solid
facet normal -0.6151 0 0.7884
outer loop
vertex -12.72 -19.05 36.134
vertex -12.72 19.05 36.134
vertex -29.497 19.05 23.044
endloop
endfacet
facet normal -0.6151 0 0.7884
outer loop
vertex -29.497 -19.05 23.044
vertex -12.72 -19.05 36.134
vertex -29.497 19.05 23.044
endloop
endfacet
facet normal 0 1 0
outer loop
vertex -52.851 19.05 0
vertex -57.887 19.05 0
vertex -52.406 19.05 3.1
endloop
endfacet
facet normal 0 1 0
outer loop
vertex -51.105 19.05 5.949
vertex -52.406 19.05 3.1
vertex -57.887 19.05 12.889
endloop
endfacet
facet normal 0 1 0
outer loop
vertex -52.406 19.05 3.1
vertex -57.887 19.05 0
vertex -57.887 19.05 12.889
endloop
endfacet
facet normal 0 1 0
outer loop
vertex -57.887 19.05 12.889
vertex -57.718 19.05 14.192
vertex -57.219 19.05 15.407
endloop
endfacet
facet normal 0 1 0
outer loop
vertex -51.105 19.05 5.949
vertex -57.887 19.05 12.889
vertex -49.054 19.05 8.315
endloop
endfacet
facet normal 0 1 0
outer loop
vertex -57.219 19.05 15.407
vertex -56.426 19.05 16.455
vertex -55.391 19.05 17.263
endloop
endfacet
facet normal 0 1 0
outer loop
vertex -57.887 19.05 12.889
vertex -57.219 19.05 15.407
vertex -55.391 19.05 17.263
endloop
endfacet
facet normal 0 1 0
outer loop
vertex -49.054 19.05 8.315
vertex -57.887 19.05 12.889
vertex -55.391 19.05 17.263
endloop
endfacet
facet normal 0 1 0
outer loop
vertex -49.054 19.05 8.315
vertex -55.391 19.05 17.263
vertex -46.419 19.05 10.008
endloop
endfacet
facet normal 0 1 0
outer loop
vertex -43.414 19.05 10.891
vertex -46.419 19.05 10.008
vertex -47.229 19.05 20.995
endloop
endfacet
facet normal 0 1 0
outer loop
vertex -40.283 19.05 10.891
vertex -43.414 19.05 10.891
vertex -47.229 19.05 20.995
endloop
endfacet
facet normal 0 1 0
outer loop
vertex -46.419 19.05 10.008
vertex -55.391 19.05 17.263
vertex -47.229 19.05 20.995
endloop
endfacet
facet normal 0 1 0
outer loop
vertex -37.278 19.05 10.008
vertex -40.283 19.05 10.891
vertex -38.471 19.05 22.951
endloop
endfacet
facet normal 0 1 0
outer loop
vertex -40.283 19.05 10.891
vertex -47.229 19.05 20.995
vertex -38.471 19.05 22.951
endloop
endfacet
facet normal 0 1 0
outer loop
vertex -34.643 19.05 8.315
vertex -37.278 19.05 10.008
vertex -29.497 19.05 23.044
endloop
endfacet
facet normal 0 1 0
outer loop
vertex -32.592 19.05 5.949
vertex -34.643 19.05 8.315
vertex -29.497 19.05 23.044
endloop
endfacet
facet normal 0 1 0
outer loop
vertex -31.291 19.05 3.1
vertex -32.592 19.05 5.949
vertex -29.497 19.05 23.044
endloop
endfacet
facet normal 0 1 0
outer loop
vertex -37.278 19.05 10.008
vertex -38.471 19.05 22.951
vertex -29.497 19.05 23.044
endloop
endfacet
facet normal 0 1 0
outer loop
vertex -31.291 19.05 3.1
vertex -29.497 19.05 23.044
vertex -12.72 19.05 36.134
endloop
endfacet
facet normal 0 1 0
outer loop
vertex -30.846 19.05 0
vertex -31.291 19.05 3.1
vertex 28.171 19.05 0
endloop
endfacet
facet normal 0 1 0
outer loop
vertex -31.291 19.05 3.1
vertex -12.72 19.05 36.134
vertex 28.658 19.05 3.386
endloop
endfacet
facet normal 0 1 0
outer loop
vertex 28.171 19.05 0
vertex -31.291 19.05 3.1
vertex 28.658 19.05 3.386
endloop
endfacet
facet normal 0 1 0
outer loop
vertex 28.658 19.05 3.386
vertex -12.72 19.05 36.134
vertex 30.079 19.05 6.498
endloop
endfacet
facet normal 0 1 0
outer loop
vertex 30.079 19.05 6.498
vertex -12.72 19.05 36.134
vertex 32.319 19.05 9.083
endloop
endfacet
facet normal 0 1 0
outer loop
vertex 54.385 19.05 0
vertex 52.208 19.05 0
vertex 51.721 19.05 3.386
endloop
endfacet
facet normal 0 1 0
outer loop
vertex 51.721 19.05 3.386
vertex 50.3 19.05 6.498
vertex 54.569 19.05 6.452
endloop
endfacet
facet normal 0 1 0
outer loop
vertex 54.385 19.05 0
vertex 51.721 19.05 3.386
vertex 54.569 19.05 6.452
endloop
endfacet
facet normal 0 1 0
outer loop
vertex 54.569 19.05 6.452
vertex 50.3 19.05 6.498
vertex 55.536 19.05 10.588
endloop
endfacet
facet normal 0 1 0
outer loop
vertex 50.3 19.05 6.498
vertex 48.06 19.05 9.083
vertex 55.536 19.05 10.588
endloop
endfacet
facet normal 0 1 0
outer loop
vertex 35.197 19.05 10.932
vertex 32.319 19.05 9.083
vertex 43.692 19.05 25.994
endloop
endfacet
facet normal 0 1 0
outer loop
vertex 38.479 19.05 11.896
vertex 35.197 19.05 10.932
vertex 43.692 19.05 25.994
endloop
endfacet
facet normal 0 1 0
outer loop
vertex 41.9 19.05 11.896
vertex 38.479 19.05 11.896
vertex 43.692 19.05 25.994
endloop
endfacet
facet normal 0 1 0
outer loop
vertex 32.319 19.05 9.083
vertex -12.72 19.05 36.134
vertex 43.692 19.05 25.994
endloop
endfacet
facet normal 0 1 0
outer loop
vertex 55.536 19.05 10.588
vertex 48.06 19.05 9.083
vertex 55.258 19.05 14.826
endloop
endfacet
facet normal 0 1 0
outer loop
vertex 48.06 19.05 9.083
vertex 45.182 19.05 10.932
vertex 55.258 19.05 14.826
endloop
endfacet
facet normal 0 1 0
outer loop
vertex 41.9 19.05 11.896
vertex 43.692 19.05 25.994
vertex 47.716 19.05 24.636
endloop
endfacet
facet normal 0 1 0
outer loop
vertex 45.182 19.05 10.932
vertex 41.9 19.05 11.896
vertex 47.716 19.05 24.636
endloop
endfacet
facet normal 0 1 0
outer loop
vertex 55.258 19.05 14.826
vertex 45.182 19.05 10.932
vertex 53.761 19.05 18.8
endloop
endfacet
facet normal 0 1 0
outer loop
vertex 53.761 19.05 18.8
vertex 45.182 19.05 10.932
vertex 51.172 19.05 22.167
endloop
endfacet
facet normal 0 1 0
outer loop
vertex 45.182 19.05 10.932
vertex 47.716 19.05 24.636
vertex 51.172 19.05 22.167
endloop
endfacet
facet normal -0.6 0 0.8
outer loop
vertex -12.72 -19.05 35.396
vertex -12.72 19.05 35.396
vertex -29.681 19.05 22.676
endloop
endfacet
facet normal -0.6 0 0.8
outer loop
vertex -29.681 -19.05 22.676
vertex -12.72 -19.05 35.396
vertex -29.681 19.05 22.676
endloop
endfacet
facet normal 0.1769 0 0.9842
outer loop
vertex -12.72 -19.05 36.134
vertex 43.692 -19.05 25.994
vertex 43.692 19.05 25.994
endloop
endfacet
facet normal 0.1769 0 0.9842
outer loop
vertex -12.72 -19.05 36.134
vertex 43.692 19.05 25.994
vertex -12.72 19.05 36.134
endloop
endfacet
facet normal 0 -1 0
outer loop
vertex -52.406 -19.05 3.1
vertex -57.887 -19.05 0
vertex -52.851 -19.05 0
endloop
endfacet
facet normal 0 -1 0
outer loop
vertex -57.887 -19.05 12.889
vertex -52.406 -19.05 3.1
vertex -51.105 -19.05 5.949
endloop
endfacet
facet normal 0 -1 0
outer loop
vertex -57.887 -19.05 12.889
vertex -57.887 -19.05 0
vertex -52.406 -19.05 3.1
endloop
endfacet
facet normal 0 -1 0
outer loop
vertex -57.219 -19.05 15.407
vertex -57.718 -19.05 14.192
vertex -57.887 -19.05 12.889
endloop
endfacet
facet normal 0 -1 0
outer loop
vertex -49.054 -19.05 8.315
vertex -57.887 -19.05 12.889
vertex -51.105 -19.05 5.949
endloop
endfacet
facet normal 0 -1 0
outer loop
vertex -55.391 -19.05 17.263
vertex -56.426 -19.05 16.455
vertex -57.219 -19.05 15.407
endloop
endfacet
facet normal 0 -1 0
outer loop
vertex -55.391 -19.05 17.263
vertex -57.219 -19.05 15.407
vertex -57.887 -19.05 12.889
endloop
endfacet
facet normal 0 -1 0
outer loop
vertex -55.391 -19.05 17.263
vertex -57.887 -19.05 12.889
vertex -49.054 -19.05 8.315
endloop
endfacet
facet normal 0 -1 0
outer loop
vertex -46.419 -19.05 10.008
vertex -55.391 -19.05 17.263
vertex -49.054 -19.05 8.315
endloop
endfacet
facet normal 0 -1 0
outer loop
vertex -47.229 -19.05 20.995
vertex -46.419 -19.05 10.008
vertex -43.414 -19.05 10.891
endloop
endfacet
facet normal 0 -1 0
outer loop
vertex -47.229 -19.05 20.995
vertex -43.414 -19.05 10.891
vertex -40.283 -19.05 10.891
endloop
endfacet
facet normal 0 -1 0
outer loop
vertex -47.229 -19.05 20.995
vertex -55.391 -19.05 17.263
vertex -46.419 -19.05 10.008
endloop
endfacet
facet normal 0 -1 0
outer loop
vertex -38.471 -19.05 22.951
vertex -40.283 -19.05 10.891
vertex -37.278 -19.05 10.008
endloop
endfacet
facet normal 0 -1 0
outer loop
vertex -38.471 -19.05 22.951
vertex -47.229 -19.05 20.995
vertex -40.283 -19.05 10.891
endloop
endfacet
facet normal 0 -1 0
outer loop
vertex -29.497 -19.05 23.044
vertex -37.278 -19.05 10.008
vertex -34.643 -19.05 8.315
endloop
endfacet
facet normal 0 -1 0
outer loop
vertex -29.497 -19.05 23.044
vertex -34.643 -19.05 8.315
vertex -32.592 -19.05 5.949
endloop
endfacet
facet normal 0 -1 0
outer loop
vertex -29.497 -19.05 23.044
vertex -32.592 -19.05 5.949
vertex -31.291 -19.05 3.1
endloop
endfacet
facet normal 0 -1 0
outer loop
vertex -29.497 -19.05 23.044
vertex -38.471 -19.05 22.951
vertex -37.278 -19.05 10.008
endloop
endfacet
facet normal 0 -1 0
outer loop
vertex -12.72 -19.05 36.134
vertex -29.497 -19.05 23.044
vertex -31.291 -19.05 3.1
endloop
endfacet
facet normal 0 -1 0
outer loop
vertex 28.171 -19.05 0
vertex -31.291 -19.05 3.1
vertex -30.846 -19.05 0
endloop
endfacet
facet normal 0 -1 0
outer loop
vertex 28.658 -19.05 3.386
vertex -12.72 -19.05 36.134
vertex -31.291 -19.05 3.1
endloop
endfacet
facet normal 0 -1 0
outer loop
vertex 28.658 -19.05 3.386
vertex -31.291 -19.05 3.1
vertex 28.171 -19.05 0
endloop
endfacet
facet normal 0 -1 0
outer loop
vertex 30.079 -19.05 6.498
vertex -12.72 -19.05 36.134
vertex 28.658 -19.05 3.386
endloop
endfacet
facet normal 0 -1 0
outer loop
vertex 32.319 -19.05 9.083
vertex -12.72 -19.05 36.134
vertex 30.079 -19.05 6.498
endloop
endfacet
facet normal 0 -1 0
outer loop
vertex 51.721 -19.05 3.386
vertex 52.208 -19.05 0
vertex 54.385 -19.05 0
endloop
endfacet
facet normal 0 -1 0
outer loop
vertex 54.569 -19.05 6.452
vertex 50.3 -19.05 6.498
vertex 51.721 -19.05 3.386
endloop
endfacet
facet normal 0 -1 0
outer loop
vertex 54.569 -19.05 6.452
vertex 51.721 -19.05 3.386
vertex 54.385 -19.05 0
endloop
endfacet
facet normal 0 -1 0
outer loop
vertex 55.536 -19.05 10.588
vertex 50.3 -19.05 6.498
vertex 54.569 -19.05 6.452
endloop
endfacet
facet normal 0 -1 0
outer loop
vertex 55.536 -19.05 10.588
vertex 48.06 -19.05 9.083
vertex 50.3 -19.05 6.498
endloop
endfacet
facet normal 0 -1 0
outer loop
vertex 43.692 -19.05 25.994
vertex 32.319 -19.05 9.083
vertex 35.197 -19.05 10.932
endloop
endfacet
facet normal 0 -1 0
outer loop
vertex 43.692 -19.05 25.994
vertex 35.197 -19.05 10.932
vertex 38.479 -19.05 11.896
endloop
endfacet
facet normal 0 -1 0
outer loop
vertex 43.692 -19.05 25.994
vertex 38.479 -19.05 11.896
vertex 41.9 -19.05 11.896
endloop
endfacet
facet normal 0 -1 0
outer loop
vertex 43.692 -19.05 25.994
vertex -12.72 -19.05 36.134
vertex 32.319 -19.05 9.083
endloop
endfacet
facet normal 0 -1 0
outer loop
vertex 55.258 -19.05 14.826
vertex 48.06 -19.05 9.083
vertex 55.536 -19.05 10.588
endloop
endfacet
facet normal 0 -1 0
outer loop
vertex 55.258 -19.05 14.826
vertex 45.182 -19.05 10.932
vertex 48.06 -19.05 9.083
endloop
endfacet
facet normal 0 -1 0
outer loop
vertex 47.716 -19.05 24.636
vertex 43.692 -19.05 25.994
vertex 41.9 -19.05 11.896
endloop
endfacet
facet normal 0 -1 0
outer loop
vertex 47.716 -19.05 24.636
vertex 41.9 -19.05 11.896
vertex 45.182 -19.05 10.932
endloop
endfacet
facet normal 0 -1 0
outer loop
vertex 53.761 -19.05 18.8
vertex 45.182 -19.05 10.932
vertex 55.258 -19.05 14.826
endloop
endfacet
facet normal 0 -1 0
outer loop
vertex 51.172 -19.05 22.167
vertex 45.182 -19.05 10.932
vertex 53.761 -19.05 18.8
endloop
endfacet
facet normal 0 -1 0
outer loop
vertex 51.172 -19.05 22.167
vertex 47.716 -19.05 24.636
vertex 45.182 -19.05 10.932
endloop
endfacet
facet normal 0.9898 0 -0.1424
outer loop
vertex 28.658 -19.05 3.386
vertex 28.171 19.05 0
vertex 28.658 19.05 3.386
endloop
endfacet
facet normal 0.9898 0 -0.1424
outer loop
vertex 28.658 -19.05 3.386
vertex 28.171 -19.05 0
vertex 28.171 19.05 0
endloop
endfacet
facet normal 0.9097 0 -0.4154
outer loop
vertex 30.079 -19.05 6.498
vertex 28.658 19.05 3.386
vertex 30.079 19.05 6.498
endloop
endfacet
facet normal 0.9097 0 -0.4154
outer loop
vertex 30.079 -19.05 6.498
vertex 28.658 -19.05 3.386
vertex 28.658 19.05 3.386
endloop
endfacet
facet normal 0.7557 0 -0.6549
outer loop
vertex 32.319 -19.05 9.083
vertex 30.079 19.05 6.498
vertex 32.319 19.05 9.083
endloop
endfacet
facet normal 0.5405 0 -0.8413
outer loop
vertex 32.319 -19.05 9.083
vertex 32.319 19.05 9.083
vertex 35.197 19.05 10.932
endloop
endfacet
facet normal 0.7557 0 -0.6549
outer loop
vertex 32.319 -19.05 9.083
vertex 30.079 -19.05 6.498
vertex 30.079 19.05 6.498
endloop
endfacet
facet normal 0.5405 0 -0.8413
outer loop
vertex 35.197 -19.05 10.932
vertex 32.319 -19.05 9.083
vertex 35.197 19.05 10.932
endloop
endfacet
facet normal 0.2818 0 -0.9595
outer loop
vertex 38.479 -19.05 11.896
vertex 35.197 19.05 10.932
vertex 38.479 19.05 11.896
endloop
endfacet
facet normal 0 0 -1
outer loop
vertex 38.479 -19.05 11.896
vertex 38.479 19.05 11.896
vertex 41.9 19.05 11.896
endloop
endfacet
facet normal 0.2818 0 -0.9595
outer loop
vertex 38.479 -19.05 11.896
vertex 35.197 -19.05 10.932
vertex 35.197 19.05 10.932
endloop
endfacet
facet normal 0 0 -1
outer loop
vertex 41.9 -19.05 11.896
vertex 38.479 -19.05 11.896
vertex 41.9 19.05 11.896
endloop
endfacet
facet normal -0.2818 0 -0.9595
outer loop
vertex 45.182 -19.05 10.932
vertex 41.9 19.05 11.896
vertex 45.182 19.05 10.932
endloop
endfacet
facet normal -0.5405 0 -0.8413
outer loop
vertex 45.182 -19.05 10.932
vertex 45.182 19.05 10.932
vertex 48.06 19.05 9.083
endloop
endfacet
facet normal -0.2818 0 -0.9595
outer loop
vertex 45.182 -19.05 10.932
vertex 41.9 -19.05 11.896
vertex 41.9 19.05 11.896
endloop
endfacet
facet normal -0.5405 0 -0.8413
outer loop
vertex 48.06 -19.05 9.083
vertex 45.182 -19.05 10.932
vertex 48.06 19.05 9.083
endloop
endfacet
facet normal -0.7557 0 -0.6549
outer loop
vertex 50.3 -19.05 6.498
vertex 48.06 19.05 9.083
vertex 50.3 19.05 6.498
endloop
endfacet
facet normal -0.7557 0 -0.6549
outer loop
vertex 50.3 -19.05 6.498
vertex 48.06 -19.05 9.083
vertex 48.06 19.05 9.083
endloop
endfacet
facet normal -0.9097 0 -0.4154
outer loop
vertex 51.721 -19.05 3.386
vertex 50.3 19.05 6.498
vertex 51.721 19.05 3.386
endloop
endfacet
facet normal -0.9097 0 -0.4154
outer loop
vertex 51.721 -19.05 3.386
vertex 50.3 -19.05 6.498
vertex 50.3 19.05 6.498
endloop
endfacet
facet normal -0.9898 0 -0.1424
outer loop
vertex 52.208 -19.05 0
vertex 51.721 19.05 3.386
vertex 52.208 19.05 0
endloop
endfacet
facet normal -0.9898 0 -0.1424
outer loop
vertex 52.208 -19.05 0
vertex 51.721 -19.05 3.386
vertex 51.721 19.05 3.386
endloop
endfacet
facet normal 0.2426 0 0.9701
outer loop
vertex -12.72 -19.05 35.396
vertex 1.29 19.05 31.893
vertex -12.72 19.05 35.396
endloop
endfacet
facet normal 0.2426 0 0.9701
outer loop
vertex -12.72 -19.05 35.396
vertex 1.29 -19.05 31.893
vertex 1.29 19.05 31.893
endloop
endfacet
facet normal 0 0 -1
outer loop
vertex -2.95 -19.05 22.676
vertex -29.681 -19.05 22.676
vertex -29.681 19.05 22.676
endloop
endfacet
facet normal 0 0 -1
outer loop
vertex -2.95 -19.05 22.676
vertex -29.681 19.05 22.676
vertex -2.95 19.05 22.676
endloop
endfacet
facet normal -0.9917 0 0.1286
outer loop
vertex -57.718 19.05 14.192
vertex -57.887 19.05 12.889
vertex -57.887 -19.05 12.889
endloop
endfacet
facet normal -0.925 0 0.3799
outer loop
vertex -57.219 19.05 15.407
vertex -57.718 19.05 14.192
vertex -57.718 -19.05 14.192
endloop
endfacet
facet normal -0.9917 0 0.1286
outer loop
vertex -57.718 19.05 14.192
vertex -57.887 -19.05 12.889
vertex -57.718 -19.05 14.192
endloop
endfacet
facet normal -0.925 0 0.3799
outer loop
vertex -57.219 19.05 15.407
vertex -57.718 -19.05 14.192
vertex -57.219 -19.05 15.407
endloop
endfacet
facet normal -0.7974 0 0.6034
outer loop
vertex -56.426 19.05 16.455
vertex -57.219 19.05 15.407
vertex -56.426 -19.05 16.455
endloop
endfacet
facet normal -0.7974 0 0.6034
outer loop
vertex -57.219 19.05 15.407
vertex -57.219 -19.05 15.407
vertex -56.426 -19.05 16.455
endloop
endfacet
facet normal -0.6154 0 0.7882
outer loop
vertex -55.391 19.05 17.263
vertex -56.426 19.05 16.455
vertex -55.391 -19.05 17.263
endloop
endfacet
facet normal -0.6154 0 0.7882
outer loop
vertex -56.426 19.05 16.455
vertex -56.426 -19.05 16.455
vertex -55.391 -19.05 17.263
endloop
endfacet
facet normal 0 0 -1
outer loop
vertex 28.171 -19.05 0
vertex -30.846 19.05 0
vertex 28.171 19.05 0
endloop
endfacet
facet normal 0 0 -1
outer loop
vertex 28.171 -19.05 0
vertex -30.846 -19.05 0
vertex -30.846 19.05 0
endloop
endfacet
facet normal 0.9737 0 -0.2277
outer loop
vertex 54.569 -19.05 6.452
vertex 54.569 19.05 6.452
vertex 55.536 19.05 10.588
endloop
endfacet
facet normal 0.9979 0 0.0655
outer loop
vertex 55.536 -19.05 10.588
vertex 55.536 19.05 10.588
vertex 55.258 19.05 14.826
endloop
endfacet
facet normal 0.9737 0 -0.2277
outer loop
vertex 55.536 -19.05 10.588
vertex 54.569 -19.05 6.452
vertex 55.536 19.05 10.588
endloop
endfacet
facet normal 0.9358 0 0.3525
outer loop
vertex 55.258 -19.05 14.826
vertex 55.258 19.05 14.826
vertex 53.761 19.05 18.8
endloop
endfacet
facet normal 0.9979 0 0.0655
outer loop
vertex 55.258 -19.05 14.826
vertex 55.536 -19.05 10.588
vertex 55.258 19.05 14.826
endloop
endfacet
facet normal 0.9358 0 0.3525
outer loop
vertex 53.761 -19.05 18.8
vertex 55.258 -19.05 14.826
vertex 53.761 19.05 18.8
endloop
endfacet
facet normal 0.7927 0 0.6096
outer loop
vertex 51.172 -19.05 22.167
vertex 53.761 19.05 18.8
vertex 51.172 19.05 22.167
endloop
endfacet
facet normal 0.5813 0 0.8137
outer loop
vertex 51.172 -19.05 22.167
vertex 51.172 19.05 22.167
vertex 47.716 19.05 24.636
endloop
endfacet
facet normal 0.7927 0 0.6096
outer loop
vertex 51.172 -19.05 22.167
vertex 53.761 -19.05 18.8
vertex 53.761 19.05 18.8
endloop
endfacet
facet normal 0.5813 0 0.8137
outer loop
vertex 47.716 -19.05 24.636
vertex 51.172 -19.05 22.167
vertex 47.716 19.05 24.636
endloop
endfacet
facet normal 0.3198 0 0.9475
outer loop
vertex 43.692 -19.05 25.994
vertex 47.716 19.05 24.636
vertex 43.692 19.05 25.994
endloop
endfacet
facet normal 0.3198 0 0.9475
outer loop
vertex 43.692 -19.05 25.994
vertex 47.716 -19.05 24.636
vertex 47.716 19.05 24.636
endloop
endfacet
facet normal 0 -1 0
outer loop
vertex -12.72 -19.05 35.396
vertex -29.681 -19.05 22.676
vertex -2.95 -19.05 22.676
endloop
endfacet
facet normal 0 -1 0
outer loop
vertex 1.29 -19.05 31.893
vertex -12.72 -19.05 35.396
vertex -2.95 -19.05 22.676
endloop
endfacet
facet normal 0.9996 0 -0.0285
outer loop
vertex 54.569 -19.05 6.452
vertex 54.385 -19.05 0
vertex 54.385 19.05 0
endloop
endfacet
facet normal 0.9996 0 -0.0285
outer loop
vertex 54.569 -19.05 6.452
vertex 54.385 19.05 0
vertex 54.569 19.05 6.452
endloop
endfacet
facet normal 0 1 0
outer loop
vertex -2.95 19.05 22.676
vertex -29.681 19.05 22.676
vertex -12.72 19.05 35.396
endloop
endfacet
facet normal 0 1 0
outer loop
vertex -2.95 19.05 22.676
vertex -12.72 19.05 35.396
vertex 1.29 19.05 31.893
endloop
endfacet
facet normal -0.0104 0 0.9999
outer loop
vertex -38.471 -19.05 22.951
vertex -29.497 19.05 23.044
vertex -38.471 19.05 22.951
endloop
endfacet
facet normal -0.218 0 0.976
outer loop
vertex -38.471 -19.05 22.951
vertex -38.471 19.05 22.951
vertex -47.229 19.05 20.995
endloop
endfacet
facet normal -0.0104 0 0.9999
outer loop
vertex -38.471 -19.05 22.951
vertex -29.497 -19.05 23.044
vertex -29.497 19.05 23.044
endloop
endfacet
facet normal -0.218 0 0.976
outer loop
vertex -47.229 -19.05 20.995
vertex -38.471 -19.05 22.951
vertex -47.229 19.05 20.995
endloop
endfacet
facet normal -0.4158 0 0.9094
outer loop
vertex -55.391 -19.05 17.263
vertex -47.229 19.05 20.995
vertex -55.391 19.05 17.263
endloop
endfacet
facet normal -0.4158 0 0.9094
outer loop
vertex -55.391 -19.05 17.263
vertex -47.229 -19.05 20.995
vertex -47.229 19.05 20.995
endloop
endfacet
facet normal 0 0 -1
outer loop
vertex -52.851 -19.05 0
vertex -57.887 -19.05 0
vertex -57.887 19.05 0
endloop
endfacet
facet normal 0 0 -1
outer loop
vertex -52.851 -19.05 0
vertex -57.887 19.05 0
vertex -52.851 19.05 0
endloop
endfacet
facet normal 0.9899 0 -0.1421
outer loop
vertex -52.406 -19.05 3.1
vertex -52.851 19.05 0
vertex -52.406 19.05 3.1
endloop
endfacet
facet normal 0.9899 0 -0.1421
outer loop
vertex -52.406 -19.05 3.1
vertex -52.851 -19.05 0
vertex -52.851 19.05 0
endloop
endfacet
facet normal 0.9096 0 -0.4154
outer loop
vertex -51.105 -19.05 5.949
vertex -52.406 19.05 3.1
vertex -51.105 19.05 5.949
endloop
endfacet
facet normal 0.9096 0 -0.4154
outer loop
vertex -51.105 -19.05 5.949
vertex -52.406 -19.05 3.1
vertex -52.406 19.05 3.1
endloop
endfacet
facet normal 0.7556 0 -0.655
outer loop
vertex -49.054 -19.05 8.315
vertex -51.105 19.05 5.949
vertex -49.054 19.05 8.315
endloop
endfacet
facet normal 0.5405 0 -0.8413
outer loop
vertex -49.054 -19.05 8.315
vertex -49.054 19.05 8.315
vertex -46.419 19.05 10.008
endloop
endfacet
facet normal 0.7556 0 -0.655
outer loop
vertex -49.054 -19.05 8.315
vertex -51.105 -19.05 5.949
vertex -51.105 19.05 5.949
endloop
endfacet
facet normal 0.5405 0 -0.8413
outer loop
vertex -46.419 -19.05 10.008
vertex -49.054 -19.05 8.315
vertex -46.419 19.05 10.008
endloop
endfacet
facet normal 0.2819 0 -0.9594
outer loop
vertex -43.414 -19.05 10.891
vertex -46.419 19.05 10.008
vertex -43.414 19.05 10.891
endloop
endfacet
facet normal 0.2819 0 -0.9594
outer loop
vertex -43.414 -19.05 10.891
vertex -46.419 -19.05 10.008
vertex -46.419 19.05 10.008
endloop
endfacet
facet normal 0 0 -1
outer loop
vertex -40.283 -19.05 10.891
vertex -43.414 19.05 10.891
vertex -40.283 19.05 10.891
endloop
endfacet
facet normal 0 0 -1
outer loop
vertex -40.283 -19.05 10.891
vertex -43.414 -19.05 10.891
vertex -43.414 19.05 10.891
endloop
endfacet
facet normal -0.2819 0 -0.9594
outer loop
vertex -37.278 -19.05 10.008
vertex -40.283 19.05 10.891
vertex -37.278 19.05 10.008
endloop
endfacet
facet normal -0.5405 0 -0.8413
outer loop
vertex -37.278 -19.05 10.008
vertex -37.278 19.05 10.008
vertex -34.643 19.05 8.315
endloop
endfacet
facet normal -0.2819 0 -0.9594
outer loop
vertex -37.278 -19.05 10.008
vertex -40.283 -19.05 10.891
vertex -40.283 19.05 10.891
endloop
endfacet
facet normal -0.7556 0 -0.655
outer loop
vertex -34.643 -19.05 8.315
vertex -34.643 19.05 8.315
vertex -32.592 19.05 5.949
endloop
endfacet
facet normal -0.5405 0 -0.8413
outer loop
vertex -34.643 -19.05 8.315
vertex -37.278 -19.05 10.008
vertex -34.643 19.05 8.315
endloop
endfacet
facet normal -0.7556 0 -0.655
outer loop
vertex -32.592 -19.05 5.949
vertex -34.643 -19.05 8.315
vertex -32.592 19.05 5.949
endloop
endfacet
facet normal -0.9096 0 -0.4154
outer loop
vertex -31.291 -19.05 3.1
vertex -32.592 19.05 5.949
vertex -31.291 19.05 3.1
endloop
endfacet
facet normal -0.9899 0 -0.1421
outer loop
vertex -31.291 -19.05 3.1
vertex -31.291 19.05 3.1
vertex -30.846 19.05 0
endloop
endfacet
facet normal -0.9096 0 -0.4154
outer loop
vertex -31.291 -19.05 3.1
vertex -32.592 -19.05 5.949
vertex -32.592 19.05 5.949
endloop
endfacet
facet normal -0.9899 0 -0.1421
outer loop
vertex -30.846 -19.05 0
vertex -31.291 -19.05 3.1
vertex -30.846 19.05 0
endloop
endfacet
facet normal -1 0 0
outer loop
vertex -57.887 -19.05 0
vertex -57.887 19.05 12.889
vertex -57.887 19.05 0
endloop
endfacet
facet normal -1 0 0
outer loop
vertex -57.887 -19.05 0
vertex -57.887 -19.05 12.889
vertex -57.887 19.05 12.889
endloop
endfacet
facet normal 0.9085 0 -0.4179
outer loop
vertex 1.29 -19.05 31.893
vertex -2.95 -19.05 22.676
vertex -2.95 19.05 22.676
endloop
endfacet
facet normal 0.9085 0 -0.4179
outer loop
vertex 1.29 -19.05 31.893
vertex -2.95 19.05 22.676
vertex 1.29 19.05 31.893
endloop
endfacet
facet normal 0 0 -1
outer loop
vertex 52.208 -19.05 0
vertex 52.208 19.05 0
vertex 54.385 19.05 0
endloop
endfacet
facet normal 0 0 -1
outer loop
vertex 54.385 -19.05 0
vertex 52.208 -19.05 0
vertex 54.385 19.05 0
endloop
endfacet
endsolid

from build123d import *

# Parameters (mm, degrees)
F2_DEPTH = 19.05
F3_R     = 5.08


with BuildPart() as f2:
    # F1 (on Front) → F2 (new body, symmetric)
    with BuildSketch(Plane.XZ):
        Polygon((-12.7204842865, 35.3961288929), (-29.6811293811, 22.6756446064), (-2.9496776406, 22.6756446064), (1.2904835166, 31.8933874369), align=None)
    extrude(amount=F2_DEPTH, both=True)


with BuildPart() as f2b:
    # F0 (on Front) → F2, piece 2 (new body, symmetric)
    with BuildSketch(Plane.XZ):
        with BuildLine():
            ThreePointArc((28.170890437, 0), (40.1893556118, 12.0184651748), (52.2078207866, 0))
            Line((52.2078207866, 0), (54.3846786022, 0))
            Line((54.3846786022, 0), (54.5690320432, 6.4524193294))
            ThreePointArc((54.5690320432, 6.4524193294), (53.76069051, 18.8003713821), (43.6920970678, 25.9940326214))
            Line((43.6920970678, 25.9940326214), (-12.7204842865, 36.1335463822))
            Line((-12.7204842865, 36.1335463822), (-29.4967740774, 23.0443552136))
            ThreePointArc((-29.4967740774, 23.0443552136), (-44.3407825455, 21.8546976248), (-57.8874200583, 15.6701616943))
            Line((-57.8874200583, 15.6701616943), (-57.8874200583, 0))
            Line((-57.8874200583, 0), (-52.8513044571, 0))
            ThreePointArc((-52.8513044571, 0), (-41.8485477567, 11.0027567004), (-30.8457910562, 0))
            Line((-30.8457910562, 0), (28.170890437, 0))
        make_face()
    extrude(amount=F2_DEPTH, both=True)

    # F3
    f3_edges = [f2b.edges().sort_by_distance(p)[0] for p in [
        (43.692097, 0, 25.994033),
        (-57.88742, 0, 15.670162),
    ]]
    fillet(f3_edges, radius=F3_R)


solid = Compound([f2.part, f2b.part])
